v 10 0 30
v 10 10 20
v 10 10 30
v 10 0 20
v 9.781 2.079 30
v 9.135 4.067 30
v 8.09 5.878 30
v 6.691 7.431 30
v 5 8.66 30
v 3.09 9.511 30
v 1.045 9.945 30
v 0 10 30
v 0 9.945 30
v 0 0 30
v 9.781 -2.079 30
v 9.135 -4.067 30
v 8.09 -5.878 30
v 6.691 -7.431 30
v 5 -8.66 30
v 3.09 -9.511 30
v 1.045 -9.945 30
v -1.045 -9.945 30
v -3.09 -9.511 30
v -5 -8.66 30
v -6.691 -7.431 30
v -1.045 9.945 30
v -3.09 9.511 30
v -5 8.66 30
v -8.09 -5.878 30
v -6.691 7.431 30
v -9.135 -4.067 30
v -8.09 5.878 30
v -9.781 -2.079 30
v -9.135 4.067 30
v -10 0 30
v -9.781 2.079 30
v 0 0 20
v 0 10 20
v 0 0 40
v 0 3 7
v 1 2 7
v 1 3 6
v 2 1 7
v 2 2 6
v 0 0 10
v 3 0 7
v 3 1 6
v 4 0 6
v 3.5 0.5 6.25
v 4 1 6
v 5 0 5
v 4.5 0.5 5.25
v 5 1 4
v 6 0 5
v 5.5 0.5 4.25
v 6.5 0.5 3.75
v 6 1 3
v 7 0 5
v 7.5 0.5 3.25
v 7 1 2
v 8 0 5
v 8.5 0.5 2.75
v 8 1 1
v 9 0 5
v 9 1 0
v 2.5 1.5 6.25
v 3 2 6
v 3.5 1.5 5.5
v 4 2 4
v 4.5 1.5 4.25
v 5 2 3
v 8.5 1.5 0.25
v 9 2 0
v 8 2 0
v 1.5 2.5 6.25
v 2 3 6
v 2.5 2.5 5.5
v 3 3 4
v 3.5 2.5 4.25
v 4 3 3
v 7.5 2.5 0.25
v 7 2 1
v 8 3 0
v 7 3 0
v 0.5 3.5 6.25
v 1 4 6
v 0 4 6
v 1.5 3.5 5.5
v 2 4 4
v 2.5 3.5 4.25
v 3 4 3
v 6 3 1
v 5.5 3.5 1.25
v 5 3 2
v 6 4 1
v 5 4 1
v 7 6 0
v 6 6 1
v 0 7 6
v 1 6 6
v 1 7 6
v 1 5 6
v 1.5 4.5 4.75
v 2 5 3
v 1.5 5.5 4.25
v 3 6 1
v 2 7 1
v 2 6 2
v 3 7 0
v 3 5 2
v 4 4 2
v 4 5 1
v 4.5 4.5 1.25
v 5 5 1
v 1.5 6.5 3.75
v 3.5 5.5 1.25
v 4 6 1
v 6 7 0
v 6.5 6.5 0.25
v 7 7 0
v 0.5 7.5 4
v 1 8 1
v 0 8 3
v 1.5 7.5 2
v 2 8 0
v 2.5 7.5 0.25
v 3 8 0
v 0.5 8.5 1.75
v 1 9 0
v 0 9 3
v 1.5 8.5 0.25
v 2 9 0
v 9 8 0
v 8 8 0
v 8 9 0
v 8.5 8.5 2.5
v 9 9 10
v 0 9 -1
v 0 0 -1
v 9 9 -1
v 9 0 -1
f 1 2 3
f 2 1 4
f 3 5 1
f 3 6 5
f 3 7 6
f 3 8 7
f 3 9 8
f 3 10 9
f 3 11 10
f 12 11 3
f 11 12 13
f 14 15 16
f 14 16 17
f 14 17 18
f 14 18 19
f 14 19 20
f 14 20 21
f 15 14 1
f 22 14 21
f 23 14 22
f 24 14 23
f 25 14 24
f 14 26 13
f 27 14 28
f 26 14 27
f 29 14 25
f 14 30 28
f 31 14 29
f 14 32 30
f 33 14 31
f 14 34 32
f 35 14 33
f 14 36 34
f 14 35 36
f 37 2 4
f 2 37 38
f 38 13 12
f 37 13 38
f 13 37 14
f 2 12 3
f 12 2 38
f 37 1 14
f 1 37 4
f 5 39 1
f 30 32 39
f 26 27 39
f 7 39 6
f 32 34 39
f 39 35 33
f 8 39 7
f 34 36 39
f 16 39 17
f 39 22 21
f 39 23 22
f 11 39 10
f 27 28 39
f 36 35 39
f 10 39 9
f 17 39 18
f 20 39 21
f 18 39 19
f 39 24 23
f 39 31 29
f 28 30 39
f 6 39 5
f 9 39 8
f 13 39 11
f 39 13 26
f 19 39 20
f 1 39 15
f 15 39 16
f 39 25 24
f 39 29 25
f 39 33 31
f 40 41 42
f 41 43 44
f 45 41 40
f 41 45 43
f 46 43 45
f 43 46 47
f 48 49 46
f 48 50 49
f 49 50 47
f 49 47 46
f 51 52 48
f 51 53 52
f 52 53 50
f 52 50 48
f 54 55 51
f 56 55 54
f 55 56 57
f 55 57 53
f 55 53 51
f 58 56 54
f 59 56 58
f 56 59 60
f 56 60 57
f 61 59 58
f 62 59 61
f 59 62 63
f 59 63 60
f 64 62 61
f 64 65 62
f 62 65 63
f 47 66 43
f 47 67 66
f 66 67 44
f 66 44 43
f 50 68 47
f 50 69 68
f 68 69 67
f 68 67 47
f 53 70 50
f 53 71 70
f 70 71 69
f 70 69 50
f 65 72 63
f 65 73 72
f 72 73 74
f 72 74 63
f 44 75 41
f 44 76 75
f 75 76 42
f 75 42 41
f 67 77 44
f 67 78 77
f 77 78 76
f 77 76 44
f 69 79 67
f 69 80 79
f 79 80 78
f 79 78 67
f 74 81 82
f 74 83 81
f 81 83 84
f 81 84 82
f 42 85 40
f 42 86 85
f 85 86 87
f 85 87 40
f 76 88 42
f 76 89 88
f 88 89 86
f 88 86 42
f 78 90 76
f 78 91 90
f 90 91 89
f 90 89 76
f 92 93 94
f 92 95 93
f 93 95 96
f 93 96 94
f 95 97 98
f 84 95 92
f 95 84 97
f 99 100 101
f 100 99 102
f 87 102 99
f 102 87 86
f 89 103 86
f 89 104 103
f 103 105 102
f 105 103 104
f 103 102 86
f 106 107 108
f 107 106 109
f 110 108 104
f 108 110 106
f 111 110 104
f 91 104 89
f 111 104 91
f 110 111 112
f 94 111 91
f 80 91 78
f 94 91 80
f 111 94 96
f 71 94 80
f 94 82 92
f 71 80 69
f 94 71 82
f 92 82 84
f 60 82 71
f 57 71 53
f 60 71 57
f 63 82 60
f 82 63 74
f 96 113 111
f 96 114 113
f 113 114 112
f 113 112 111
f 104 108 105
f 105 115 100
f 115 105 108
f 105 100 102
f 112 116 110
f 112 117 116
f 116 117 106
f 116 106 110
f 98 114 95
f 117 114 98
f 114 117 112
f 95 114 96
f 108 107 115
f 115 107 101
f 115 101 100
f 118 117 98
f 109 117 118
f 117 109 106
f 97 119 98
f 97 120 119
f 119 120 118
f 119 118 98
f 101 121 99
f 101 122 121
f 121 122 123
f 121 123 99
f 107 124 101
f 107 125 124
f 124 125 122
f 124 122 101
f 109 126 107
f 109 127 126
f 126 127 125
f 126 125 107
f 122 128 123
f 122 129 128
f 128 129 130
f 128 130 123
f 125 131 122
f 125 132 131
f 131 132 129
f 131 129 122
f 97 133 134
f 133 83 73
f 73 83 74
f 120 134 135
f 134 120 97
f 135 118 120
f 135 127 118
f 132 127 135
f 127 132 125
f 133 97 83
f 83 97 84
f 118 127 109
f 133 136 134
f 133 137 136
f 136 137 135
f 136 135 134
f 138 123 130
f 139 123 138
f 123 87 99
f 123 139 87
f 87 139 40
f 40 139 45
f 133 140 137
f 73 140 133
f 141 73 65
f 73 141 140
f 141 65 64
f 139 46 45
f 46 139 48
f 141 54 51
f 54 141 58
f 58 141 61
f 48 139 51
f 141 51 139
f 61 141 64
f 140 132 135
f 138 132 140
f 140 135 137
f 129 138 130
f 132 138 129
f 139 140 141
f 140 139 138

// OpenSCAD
// file: variables.scad
// Animation Test; variables file.

mv_x=1.0;
mv_y=20.0;
mv_z=0.0;
rot_x=15;
rot_y=90;
rot_z=0;
// main file
// Animation Test; main

include <variables.scad>;
echo(str("Translate: ",mv_x,",",mv_y,",",mv_z));
echo(str("  Rotate: ",rot_x,",",rot_y,",",rot_z));
echo(str("Time: ",$t));
echo("Viewport:");
echo(str("  $vpr=",$vpr));
echo(str("  $vpt=",$vpt));
echo(str("  $vpd=",$vpd));

translate([0,0,20]) translate([mv_x,mv_y,mv_z]*$t) rotate([rot_x,rot_y,rot_z]*$t) {
    cube([10,10,10],center=false);
    translate([0,0,10]) cylinder(r1=10,r2=0,h=10,center=false);
}

surface("surface.dat");
